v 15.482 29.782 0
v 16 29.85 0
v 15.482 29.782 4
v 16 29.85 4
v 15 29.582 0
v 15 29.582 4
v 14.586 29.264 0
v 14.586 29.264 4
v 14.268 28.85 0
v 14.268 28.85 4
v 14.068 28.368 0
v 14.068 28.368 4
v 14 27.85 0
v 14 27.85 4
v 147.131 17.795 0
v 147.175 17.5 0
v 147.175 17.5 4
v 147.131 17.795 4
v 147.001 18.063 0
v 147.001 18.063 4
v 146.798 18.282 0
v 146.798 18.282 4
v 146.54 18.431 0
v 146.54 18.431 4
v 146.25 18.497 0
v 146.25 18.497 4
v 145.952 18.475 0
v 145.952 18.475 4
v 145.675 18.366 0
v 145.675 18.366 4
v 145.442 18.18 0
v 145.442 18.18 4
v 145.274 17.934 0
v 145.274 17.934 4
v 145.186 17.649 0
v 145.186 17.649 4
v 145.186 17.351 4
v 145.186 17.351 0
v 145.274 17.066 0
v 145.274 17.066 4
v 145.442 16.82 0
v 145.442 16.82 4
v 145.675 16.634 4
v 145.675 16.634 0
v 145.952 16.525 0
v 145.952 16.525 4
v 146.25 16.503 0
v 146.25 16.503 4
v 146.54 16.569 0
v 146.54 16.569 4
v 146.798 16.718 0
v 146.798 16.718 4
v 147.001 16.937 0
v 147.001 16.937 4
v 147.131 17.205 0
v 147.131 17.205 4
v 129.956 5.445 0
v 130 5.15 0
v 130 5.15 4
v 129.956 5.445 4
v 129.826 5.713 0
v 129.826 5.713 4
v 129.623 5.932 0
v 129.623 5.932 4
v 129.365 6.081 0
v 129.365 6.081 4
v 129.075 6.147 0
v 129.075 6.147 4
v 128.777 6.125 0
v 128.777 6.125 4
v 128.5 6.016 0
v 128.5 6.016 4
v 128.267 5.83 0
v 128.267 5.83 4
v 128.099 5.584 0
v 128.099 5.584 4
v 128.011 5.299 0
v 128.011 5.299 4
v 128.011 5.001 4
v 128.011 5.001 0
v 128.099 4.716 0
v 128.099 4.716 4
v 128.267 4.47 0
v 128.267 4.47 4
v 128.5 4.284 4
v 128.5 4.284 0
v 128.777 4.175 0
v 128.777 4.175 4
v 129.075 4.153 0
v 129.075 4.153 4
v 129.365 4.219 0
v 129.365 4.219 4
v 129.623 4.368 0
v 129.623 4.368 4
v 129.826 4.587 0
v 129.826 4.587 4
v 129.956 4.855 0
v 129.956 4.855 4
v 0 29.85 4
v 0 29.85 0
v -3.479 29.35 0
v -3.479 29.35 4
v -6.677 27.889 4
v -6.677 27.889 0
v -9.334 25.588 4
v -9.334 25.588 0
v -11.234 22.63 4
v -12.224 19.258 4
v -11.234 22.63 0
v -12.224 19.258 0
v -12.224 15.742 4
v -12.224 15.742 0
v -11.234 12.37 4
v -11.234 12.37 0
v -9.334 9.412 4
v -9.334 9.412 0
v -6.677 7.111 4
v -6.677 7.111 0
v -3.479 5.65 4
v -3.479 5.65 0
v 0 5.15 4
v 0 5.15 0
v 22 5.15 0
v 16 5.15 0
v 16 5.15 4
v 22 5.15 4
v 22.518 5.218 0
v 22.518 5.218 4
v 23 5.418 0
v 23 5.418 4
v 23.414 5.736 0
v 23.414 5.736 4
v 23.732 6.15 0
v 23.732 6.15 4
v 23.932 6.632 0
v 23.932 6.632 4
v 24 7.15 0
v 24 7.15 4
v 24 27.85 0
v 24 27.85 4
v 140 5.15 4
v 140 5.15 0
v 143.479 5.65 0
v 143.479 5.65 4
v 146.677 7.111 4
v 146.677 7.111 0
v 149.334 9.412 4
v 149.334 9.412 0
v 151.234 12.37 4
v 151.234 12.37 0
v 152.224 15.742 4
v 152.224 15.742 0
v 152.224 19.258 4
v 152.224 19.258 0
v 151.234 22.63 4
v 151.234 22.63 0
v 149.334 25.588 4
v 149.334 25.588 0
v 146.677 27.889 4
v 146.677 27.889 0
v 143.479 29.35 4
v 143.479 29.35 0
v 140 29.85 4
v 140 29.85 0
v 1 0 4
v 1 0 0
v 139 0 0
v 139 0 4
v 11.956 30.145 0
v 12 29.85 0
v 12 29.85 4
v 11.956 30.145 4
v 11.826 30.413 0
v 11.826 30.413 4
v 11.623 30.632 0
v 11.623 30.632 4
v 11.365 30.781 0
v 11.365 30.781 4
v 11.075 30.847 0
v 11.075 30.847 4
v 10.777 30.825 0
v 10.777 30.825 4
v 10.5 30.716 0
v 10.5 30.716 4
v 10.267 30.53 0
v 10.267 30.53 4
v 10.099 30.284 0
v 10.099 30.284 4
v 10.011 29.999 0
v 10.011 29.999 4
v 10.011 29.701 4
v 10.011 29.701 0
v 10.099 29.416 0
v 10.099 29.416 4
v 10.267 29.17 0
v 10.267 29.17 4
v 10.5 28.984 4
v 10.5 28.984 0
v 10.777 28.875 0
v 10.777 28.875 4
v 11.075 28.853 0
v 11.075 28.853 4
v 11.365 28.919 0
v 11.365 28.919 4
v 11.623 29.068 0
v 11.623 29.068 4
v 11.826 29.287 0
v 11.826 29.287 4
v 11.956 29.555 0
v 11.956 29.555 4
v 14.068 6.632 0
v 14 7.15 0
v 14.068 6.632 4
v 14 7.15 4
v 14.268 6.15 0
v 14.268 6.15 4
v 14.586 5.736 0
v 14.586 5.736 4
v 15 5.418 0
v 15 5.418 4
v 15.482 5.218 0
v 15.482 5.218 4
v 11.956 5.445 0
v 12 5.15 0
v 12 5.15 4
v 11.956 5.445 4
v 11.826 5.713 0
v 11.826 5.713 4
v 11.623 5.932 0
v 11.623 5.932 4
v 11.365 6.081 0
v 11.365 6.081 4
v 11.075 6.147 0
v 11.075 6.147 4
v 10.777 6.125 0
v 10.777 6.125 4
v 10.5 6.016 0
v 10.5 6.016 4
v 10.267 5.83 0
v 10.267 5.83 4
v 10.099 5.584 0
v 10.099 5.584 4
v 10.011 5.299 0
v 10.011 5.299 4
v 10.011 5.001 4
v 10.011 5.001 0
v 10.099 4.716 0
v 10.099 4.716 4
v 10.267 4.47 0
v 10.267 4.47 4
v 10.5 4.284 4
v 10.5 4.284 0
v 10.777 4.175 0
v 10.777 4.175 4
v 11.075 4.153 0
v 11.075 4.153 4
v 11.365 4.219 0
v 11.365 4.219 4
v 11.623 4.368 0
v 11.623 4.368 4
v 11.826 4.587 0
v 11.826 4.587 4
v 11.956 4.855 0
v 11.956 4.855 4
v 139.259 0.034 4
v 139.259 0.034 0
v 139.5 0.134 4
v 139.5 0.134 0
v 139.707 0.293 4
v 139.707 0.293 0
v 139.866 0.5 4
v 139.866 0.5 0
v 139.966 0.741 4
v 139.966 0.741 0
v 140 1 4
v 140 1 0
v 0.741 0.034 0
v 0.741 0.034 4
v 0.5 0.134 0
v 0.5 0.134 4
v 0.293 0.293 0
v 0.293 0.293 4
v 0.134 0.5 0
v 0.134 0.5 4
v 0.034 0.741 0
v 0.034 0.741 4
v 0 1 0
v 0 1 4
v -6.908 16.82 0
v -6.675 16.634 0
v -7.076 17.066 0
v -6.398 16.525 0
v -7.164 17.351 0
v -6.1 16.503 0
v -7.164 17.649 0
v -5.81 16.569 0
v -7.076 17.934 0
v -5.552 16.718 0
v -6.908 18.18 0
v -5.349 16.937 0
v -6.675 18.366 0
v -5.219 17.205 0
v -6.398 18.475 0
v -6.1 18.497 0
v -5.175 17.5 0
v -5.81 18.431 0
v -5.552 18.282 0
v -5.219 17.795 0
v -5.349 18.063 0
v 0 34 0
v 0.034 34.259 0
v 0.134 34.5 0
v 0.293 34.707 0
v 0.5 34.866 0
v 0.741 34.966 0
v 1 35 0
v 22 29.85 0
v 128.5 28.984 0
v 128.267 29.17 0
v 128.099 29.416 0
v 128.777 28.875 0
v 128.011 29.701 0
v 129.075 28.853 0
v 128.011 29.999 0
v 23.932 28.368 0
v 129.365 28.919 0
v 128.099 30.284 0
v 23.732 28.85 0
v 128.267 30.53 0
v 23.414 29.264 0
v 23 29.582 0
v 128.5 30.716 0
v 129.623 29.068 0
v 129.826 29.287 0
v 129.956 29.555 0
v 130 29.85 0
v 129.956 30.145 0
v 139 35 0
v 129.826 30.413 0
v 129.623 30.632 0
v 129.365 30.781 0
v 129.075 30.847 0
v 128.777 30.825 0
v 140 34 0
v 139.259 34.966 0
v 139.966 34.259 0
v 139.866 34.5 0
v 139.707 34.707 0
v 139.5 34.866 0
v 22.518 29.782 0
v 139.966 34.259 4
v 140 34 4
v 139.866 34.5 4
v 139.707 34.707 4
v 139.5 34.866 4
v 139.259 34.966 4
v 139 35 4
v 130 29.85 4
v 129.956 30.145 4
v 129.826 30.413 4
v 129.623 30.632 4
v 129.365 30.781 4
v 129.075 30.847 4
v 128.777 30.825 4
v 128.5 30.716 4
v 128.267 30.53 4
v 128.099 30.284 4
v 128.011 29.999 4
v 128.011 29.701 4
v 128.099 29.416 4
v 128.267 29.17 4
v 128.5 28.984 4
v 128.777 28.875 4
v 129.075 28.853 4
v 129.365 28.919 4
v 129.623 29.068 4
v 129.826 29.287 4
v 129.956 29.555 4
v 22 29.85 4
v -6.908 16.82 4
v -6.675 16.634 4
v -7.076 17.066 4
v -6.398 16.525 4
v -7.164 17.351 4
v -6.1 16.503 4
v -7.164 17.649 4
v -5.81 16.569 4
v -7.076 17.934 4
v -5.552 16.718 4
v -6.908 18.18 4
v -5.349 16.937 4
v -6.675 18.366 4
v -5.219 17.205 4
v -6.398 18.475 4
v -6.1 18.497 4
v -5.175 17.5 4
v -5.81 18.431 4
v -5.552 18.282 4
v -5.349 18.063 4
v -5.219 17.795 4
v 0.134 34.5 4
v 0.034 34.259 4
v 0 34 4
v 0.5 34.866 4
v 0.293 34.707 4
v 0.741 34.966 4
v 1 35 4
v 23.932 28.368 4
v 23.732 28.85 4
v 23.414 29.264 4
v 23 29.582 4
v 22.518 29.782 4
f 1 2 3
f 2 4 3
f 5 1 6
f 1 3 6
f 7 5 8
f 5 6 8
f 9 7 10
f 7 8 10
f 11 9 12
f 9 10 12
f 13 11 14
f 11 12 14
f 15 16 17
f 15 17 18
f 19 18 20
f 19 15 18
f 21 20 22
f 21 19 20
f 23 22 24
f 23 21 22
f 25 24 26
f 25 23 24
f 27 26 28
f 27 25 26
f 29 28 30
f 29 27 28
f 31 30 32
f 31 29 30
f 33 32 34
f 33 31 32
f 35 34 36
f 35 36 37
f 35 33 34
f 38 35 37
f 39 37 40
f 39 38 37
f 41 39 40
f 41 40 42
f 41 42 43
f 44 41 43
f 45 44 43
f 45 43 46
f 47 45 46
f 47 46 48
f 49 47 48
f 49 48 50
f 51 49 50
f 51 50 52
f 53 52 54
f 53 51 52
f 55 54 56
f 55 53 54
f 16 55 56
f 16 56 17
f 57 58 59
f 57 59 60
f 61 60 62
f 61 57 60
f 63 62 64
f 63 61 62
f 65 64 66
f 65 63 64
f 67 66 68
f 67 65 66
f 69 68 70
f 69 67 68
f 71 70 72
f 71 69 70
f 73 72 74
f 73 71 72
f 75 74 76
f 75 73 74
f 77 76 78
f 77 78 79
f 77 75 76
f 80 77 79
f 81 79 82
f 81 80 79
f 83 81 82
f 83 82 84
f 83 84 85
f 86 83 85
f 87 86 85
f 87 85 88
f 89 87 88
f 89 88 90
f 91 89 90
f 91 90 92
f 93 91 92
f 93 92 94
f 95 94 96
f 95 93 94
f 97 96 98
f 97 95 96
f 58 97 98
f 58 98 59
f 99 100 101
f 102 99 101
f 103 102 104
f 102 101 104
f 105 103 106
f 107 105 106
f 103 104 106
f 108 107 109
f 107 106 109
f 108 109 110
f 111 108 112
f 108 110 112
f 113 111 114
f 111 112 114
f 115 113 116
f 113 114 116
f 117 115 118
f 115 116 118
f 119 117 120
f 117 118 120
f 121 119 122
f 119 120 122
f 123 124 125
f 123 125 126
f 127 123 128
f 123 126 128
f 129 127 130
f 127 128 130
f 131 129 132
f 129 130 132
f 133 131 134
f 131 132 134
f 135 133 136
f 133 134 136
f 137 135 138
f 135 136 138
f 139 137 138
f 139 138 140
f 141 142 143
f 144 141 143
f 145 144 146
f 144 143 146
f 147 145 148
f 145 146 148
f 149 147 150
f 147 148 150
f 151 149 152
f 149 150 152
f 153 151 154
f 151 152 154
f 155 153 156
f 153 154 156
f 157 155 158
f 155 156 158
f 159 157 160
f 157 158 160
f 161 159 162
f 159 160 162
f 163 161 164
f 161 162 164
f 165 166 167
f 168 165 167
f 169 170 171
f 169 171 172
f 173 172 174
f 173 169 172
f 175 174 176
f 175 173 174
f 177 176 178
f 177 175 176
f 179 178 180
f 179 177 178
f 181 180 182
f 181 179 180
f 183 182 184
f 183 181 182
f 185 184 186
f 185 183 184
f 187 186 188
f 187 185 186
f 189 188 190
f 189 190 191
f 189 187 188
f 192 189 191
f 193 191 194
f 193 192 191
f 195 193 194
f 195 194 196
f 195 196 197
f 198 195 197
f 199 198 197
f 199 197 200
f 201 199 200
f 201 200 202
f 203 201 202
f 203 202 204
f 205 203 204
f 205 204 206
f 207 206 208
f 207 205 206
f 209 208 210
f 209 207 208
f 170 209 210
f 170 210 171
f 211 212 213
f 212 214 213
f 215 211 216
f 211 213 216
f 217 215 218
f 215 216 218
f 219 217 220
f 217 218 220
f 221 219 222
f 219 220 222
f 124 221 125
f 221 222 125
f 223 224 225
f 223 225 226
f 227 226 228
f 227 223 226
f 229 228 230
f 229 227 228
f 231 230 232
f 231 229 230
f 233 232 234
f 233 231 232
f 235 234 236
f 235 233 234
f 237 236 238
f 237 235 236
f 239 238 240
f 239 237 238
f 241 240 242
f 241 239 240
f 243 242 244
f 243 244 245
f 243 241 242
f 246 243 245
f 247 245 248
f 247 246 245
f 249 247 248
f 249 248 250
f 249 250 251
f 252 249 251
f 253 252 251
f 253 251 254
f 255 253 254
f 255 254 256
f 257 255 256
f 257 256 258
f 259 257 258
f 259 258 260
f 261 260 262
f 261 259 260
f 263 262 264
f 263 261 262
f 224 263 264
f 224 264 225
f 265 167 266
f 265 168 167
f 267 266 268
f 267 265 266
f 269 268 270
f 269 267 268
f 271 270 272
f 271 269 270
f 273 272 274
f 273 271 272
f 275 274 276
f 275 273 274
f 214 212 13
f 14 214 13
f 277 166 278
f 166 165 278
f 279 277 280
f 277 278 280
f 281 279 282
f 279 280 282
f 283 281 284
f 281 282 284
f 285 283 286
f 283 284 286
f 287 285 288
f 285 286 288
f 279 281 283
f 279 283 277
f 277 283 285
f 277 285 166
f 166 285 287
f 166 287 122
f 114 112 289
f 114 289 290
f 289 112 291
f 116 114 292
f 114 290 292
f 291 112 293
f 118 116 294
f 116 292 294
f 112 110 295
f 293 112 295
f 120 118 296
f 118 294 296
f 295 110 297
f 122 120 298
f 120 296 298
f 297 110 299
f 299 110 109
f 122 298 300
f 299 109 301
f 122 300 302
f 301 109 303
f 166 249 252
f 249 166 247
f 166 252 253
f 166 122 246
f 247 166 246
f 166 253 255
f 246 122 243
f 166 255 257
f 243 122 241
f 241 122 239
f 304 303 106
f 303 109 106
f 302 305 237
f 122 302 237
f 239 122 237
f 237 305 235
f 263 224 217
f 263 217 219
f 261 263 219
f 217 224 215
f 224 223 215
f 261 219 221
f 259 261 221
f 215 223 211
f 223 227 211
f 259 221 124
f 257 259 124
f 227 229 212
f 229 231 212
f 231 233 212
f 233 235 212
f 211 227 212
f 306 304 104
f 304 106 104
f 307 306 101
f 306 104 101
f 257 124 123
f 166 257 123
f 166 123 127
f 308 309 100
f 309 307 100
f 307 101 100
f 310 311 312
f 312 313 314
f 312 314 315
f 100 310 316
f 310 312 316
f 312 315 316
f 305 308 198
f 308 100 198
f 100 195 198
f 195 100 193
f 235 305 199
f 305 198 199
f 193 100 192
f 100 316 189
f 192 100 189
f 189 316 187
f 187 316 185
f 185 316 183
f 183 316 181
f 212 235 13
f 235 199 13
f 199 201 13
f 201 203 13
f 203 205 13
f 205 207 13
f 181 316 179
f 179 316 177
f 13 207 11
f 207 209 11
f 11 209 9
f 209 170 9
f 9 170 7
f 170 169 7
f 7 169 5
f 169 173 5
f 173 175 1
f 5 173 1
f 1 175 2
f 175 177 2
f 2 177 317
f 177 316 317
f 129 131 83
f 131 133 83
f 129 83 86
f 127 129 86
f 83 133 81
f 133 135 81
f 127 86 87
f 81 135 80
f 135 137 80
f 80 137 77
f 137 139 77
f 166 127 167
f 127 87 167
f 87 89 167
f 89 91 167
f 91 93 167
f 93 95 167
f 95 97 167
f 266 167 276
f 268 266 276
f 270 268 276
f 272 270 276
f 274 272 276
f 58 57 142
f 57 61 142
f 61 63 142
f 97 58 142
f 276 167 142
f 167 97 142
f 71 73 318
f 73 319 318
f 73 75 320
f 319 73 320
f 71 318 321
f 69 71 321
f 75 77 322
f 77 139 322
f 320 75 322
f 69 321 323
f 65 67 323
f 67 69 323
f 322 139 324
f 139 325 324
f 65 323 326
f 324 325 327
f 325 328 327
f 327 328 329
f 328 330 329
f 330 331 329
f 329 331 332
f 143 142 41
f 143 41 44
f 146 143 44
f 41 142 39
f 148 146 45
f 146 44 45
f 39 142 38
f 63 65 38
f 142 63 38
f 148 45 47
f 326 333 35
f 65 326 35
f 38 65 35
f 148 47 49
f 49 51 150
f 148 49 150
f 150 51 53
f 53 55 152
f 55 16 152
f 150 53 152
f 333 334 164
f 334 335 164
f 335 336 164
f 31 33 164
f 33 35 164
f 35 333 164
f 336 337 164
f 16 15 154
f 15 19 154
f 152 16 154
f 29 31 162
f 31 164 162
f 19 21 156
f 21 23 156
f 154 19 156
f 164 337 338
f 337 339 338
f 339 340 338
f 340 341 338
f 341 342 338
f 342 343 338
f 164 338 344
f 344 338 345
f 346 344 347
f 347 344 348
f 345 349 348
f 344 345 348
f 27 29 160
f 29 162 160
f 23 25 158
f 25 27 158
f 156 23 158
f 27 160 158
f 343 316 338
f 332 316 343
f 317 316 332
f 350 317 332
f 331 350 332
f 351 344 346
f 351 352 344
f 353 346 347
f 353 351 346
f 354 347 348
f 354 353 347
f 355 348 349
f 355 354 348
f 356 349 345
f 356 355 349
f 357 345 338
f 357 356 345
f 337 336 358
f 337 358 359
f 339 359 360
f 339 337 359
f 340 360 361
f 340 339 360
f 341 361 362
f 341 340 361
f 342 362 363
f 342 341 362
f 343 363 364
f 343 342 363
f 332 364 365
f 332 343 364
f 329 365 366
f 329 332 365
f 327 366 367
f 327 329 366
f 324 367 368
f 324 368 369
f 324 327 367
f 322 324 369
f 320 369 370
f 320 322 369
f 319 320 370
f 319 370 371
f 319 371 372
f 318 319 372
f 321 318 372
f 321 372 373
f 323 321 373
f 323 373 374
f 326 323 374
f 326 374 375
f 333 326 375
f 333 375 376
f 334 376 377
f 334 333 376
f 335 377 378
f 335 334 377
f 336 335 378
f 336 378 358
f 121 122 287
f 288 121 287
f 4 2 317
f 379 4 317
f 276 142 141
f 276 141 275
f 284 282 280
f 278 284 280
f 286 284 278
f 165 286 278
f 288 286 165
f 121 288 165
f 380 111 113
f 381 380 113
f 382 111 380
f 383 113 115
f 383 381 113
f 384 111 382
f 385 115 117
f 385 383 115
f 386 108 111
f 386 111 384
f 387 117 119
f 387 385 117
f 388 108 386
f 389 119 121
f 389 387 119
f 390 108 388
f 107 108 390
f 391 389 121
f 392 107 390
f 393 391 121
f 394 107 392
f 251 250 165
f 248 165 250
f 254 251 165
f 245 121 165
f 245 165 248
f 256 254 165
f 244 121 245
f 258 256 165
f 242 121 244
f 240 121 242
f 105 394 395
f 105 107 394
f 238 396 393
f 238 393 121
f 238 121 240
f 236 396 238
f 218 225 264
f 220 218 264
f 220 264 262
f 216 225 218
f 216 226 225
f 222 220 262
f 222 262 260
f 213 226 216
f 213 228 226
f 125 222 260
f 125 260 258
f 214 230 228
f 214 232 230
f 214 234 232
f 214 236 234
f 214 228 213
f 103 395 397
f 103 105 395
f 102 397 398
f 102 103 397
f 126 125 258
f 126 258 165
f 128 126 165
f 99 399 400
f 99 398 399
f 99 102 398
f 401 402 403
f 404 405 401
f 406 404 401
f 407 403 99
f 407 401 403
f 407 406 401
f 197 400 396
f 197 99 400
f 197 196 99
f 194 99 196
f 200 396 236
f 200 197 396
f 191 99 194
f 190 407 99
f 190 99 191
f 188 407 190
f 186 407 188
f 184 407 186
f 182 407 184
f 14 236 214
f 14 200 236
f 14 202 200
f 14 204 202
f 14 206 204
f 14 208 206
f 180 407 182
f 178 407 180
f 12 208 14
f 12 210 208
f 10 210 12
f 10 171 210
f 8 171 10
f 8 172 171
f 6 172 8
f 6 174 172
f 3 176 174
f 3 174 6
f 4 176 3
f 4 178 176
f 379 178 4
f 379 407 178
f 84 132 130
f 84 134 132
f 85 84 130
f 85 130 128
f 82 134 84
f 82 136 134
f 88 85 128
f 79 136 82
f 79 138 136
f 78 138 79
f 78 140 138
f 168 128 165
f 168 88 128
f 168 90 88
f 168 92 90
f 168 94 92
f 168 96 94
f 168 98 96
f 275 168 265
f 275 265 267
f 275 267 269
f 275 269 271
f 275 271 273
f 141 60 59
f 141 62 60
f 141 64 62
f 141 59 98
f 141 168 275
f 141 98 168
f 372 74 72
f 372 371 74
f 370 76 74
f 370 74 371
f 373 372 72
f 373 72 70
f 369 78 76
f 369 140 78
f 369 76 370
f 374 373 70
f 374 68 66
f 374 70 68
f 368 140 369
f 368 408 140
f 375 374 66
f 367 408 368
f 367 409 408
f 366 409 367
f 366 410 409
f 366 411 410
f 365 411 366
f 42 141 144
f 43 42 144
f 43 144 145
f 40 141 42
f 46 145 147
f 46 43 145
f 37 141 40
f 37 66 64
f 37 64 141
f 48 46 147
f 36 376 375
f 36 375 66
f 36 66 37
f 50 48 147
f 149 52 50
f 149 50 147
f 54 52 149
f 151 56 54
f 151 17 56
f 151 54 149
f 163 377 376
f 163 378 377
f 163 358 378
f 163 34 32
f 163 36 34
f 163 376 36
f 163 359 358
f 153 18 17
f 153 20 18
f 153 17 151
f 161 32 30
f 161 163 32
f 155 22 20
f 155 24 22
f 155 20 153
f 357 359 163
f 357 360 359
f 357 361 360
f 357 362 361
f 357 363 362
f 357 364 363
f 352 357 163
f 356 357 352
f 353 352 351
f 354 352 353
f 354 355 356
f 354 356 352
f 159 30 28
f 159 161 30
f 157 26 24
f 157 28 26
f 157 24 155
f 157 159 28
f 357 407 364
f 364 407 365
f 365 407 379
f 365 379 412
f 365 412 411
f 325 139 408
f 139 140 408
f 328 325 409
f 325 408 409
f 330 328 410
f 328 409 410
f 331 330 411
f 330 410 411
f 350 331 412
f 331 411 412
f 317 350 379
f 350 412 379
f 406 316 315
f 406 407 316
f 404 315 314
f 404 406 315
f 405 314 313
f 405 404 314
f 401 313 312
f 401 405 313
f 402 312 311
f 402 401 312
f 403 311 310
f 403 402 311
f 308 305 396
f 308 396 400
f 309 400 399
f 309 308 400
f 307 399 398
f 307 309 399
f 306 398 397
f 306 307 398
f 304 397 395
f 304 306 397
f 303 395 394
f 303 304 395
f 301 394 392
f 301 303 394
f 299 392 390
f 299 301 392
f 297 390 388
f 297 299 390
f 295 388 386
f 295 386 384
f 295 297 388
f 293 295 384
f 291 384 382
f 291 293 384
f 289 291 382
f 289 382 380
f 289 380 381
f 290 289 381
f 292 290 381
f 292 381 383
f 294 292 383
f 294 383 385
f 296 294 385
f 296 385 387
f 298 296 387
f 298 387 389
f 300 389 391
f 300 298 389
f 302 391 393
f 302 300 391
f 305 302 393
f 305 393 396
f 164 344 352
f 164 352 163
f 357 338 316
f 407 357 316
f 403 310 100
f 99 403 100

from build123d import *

# Parameters (mm, degrees)
SKETCH_R    = 1
SKETCH_W    = 10
SKETCH_H    = 24.7
PAD_DEPTH   = 4
FILLET_R    = 1
FILLET001_R = 1
FILLET002_R = 1
FILLET003_R = 1
FILLET004_R = 2
FILLET005_R = 2
FILLET006_R = 2
FILLET007_R = 2


with BuildPart() as part:
    # Sketch → Pad (new body)
    with BuildSketch(Plane.XY):
        with BuildLine():
            Line((0, 0), (140, 0))
            Line((140, 5.15), (140, 0))
            ThreePointArc((140, 5.15), (152.35, 17.5), (140, 29.85))
            Line((140, 35), (140, 29.85))
            Line((140, 35), (0, 35))
            Line((0, 35), (0, 29.85))
            ThreePointArc((0, 29.85), (-12.35, 17.5), (0, 5.15))
            Line((0, 5.15), (0, 0))
        make_face()
        with Locations((129, 29.85)):
            Circle(SKETCH_R, mode=Mode.SUBTRACT)
        with Locations((129, 5.15)):
            Circle(SKETCH_R, mode=Mode.SUBTRACT)
        with Locations((11, 29.85)):
            Circle(SKETCH_R, mode=Mode.SUBTRACT)
        with Locations((11, 5.15)):
            Circle(SKETCH_R, mode=Mode.SUBTRACT)
        with Locations((-6.175, 17.5)):
            Circle(SKETCH_R, mode=Mode.SUBTRACT)
        with Locations((146.175, 17.5)):
            Circle(SKETCH_R, mode=Mode.SUBTRACT)
        with Locations((19, 17.5)):
            Rectangle(SKETCH_W, SKETCH_H, mode=Mode.SUBTRACT)
    extrude(amount=PAD_DEPTH)

    # Fillet
    fillet_edges = [part.edges().sort_by_distance(p)[0] for p in [
        (140, 0, 2),
    ]]
    fillet(fillet_edges, radius=FILLET_R)

    # Fillet001
    fillet001_edges = [part.edges().sort_by_distance(p)[0] for p in [
        (0, 0, 2),
    ]]
    fillet(fillet001_edges, radius=FILLET001_R)

    # Fillet002
    fillet002_edges = [part.edges().sort_by_distance(p)[0] for p in [
        (140, 35, 2),
    ]]
    fillet(fillet002_edges, radius=FILLET002_R)

    # Fillet003
    fillet003_edges = [part.edges().sort_by_distance(p)[0] for p in [
        (0, 35, 2),
    ]]
    fillet(fillet003_edges, radius=FILLET003_R)

    # Fillet004
    fillet004_edges = [part.edges().sort_by_distance(p)[0] for p in [
        (14, 29.85, 2),
    ]]
    fillet(fillet004_edges, radius=FILLET004_R)

    # Fillet005
    fillet005_edges = [part.edges().sort_by_distance(p)[0] for p in [
        (14, 5.15, 2),
    ]]
    fillet(fillet005_edges, radius=FILLET005_R)

    # Fillet006
    fillet006_edges = [part.edges().sort_by_distance(p)[0] for p in [
        (24, 5.15, 2),
    ]]
    fillet(fillet006_edges, radius=FILLET006_R)

    # Fillet007
    fillet007_edges = [part.edges().sort_by_distance(p)[0] for p in [
        (24, 29.85, 2),
    ]]
    fillet(fillet007_edges, radius=FILLET007_R)


solid = part.part
